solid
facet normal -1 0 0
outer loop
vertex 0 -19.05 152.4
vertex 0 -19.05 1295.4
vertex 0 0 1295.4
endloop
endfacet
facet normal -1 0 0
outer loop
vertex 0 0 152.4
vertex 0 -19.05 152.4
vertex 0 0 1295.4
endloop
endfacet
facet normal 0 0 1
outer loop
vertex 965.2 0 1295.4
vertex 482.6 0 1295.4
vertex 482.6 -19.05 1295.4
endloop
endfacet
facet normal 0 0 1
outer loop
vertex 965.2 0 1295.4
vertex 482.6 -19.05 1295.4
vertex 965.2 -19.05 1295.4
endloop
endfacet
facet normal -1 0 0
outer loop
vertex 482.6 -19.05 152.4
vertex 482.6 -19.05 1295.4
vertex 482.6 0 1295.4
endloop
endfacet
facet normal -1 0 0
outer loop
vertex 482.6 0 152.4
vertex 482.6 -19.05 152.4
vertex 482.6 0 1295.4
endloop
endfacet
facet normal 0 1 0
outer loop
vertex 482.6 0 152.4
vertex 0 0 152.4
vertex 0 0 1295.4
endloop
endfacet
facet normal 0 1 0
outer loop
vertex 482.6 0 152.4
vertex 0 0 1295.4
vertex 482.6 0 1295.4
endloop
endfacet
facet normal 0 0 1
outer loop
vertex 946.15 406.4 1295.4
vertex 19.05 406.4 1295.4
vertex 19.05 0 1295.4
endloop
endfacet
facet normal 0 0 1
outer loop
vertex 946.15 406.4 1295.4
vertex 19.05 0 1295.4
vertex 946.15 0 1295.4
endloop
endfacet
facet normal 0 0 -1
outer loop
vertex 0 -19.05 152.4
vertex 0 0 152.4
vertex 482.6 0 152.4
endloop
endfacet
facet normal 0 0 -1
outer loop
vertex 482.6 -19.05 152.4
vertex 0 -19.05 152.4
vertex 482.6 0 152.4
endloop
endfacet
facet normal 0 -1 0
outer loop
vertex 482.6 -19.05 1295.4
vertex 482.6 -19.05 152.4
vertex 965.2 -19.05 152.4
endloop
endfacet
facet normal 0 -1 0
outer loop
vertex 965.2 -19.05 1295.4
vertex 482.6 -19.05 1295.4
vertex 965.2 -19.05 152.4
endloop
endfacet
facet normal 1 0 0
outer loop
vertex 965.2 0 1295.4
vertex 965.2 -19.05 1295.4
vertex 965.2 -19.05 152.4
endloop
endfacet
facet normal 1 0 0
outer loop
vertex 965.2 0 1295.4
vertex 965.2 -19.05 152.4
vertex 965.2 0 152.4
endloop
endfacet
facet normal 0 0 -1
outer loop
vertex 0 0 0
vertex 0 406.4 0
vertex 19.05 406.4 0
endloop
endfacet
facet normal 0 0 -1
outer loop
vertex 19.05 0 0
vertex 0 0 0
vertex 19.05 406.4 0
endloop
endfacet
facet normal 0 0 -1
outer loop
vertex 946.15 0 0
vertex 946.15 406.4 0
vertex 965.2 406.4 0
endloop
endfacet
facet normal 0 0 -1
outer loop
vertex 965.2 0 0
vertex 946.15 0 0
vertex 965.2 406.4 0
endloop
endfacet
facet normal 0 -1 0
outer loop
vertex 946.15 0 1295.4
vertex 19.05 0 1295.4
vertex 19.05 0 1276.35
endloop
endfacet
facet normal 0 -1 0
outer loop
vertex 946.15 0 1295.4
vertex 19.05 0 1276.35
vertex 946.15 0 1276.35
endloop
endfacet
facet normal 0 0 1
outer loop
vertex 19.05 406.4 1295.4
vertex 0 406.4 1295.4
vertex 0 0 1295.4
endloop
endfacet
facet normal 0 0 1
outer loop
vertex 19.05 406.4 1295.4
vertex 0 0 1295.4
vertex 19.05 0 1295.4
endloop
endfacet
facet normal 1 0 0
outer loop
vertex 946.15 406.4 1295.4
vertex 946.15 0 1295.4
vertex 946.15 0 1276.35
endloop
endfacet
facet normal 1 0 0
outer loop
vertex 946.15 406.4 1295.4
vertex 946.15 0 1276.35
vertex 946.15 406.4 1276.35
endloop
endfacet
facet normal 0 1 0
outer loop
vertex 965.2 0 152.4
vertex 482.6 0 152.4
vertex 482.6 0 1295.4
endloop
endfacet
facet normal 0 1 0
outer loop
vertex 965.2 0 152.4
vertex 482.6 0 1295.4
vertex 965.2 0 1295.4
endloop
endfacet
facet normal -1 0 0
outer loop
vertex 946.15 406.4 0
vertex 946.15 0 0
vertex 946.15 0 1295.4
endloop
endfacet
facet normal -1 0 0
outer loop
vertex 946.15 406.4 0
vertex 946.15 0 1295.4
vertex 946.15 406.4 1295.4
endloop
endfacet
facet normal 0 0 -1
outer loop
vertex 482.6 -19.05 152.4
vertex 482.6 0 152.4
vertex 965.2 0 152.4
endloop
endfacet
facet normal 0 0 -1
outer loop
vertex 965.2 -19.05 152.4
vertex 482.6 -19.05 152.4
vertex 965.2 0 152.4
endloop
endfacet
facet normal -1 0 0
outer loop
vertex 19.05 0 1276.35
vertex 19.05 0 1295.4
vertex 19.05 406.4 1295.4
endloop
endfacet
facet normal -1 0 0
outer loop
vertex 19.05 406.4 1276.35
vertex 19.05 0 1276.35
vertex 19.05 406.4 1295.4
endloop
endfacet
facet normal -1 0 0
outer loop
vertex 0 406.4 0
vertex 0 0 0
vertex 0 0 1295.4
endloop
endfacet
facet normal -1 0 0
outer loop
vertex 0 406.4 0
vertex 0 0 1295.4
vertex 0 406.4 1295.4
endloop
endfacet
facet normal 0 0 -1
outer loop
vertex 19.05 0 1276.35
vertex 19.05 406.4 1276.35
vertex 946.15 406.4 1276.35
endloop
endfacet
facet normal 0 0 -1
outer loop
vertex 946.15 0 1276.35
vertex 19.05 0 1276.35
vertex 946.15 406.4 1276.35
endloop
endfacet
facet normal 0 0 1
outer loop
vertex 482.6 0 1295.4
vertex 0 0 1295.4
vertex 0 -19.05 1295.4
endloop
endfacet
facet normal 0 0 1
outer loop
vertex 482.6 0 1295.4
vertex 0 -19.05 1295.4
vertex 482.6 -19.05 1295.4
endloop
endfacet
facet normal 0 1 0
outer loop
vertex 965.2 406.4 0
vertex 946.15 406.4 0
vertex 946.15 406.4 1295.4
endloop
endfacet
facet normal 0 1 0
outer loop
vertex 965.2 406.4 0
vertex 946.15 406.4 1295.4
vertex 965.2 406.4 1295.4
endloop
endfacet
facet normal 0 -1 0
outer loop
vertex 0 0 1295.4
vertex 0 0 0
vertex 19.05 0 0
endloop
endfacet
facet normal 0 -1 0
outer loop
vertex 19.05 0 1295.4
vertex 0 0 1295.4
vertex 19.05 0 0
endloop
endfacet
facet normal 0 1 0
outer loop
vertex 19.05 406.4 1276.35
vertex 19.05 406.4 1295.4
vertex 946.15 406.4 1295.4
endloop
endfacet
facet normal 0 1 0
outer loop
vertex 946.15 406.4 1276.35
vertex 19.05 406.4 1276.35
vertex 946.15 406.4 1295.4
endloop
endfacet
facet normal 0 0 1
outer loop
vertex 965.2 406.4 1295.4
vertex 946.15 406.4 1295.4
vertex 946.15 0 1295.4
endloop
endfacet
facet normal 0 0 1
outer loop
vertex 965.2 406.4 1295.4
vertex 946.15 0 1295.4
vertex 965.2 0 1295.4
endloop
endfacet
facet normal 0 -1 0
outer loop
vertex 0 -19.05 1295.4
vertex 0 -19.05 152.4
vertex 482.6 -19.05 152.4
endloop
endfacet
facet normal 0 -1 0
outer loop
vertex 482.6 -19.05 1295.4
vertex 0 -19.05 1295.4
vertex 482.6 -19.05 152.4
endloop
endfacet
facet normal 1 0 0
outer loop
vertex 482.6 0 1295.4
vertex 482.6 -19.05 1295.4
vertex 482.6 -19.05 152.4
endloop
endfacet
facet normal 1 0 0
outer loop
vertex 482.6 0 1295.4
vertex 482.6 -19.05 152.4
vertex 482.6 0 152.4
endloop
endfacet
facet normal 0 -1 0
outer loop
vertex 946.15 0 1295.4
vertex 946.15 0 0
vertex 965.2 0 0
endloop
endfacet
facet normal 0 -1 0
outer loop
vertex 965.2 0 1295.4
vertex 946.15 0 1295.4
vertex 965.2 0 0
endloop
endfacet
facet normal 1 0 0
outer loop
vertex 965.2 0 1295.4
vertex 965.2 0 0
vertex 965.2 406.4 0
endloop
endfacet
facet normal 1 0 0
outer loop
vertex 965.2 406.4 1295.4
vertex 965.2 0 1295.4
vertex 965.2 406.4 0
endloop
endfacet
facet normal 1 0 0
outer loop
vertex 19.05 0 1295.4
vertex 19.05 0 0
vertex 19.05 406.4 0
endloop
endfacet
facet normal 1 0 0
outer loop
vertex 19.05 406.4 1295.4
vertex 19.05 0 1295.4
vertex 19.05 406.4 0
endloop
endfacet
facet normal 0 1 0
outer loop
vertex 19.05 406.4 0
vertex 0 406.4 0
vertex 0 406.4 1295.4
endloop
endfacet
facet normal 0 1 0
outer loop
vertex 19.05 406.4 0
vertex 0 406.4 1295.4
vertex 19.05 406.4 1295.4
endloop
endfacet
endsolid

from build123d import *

# Parameters (mm, degrees)
F0_W      = 19.05
F0_H      = 406.4
F3_DEPTH  = 1295.4
F5_W      = 19.05
F5_H      = 406.4
F6_DEPTH  = 1295.4
F7_W      = 927.1
F7_H      = 406.4
F8_DEPTH  = 19.05
F9_W      = 482.6
F9_H      = 19.05
F10_DEPTH = 1143
F11_DEPTH = 1143


with BuildPart() as f3:
    # F0 (on Top) → F3 (new body)
    with BuildSketch(Plane.XY):
        with Locations((9.525, 203.2)):
            Rectangle(F0_W, F0_H)
    extrude(amount=F3_DEPTH)


with BuildPart() as f6:
    # F5 (on Top) → F6 (new body)
    with BuildSketch(Plane.XY):
        with Locations((955.675, 203.2)):
            Rectangle(F5_W, F5_H)
    extrude(amount=F6_DEPTH)


with BuildPart() as f8:
    # F7 (on offset) → F8 (new body)
    with BuildSketch(Plane.XY.offset(1295.4)):
        with Locations((482.6, 203.2)):
            Rectangle(F7_W, F7_H)
    extrude(amount=-F8_DEPTH)


with BuildPart() as f10:
    # F9 (on offset) → F10 (new body)
    with BuildSketch(Plane.XY.offset(152.4)):
        with Locations((241.3, -9.525)):
            Rectangle(F9_W, F9_H)
    extrude(amount=F10_DEPTH)


with BuildPart() as f11:
    # F9 (on offset) → F11 (new body)
    with BuildSketch(Plane.XY.offset(152.4)):
        with Locations((723.9, -9.525)):
            Rectangle(F9_W, F9_H)
    extrude(amount=F11_DEPTH)


solid = Compound([f3.part, f6.part, f8.part, f10.part, f11.part])
